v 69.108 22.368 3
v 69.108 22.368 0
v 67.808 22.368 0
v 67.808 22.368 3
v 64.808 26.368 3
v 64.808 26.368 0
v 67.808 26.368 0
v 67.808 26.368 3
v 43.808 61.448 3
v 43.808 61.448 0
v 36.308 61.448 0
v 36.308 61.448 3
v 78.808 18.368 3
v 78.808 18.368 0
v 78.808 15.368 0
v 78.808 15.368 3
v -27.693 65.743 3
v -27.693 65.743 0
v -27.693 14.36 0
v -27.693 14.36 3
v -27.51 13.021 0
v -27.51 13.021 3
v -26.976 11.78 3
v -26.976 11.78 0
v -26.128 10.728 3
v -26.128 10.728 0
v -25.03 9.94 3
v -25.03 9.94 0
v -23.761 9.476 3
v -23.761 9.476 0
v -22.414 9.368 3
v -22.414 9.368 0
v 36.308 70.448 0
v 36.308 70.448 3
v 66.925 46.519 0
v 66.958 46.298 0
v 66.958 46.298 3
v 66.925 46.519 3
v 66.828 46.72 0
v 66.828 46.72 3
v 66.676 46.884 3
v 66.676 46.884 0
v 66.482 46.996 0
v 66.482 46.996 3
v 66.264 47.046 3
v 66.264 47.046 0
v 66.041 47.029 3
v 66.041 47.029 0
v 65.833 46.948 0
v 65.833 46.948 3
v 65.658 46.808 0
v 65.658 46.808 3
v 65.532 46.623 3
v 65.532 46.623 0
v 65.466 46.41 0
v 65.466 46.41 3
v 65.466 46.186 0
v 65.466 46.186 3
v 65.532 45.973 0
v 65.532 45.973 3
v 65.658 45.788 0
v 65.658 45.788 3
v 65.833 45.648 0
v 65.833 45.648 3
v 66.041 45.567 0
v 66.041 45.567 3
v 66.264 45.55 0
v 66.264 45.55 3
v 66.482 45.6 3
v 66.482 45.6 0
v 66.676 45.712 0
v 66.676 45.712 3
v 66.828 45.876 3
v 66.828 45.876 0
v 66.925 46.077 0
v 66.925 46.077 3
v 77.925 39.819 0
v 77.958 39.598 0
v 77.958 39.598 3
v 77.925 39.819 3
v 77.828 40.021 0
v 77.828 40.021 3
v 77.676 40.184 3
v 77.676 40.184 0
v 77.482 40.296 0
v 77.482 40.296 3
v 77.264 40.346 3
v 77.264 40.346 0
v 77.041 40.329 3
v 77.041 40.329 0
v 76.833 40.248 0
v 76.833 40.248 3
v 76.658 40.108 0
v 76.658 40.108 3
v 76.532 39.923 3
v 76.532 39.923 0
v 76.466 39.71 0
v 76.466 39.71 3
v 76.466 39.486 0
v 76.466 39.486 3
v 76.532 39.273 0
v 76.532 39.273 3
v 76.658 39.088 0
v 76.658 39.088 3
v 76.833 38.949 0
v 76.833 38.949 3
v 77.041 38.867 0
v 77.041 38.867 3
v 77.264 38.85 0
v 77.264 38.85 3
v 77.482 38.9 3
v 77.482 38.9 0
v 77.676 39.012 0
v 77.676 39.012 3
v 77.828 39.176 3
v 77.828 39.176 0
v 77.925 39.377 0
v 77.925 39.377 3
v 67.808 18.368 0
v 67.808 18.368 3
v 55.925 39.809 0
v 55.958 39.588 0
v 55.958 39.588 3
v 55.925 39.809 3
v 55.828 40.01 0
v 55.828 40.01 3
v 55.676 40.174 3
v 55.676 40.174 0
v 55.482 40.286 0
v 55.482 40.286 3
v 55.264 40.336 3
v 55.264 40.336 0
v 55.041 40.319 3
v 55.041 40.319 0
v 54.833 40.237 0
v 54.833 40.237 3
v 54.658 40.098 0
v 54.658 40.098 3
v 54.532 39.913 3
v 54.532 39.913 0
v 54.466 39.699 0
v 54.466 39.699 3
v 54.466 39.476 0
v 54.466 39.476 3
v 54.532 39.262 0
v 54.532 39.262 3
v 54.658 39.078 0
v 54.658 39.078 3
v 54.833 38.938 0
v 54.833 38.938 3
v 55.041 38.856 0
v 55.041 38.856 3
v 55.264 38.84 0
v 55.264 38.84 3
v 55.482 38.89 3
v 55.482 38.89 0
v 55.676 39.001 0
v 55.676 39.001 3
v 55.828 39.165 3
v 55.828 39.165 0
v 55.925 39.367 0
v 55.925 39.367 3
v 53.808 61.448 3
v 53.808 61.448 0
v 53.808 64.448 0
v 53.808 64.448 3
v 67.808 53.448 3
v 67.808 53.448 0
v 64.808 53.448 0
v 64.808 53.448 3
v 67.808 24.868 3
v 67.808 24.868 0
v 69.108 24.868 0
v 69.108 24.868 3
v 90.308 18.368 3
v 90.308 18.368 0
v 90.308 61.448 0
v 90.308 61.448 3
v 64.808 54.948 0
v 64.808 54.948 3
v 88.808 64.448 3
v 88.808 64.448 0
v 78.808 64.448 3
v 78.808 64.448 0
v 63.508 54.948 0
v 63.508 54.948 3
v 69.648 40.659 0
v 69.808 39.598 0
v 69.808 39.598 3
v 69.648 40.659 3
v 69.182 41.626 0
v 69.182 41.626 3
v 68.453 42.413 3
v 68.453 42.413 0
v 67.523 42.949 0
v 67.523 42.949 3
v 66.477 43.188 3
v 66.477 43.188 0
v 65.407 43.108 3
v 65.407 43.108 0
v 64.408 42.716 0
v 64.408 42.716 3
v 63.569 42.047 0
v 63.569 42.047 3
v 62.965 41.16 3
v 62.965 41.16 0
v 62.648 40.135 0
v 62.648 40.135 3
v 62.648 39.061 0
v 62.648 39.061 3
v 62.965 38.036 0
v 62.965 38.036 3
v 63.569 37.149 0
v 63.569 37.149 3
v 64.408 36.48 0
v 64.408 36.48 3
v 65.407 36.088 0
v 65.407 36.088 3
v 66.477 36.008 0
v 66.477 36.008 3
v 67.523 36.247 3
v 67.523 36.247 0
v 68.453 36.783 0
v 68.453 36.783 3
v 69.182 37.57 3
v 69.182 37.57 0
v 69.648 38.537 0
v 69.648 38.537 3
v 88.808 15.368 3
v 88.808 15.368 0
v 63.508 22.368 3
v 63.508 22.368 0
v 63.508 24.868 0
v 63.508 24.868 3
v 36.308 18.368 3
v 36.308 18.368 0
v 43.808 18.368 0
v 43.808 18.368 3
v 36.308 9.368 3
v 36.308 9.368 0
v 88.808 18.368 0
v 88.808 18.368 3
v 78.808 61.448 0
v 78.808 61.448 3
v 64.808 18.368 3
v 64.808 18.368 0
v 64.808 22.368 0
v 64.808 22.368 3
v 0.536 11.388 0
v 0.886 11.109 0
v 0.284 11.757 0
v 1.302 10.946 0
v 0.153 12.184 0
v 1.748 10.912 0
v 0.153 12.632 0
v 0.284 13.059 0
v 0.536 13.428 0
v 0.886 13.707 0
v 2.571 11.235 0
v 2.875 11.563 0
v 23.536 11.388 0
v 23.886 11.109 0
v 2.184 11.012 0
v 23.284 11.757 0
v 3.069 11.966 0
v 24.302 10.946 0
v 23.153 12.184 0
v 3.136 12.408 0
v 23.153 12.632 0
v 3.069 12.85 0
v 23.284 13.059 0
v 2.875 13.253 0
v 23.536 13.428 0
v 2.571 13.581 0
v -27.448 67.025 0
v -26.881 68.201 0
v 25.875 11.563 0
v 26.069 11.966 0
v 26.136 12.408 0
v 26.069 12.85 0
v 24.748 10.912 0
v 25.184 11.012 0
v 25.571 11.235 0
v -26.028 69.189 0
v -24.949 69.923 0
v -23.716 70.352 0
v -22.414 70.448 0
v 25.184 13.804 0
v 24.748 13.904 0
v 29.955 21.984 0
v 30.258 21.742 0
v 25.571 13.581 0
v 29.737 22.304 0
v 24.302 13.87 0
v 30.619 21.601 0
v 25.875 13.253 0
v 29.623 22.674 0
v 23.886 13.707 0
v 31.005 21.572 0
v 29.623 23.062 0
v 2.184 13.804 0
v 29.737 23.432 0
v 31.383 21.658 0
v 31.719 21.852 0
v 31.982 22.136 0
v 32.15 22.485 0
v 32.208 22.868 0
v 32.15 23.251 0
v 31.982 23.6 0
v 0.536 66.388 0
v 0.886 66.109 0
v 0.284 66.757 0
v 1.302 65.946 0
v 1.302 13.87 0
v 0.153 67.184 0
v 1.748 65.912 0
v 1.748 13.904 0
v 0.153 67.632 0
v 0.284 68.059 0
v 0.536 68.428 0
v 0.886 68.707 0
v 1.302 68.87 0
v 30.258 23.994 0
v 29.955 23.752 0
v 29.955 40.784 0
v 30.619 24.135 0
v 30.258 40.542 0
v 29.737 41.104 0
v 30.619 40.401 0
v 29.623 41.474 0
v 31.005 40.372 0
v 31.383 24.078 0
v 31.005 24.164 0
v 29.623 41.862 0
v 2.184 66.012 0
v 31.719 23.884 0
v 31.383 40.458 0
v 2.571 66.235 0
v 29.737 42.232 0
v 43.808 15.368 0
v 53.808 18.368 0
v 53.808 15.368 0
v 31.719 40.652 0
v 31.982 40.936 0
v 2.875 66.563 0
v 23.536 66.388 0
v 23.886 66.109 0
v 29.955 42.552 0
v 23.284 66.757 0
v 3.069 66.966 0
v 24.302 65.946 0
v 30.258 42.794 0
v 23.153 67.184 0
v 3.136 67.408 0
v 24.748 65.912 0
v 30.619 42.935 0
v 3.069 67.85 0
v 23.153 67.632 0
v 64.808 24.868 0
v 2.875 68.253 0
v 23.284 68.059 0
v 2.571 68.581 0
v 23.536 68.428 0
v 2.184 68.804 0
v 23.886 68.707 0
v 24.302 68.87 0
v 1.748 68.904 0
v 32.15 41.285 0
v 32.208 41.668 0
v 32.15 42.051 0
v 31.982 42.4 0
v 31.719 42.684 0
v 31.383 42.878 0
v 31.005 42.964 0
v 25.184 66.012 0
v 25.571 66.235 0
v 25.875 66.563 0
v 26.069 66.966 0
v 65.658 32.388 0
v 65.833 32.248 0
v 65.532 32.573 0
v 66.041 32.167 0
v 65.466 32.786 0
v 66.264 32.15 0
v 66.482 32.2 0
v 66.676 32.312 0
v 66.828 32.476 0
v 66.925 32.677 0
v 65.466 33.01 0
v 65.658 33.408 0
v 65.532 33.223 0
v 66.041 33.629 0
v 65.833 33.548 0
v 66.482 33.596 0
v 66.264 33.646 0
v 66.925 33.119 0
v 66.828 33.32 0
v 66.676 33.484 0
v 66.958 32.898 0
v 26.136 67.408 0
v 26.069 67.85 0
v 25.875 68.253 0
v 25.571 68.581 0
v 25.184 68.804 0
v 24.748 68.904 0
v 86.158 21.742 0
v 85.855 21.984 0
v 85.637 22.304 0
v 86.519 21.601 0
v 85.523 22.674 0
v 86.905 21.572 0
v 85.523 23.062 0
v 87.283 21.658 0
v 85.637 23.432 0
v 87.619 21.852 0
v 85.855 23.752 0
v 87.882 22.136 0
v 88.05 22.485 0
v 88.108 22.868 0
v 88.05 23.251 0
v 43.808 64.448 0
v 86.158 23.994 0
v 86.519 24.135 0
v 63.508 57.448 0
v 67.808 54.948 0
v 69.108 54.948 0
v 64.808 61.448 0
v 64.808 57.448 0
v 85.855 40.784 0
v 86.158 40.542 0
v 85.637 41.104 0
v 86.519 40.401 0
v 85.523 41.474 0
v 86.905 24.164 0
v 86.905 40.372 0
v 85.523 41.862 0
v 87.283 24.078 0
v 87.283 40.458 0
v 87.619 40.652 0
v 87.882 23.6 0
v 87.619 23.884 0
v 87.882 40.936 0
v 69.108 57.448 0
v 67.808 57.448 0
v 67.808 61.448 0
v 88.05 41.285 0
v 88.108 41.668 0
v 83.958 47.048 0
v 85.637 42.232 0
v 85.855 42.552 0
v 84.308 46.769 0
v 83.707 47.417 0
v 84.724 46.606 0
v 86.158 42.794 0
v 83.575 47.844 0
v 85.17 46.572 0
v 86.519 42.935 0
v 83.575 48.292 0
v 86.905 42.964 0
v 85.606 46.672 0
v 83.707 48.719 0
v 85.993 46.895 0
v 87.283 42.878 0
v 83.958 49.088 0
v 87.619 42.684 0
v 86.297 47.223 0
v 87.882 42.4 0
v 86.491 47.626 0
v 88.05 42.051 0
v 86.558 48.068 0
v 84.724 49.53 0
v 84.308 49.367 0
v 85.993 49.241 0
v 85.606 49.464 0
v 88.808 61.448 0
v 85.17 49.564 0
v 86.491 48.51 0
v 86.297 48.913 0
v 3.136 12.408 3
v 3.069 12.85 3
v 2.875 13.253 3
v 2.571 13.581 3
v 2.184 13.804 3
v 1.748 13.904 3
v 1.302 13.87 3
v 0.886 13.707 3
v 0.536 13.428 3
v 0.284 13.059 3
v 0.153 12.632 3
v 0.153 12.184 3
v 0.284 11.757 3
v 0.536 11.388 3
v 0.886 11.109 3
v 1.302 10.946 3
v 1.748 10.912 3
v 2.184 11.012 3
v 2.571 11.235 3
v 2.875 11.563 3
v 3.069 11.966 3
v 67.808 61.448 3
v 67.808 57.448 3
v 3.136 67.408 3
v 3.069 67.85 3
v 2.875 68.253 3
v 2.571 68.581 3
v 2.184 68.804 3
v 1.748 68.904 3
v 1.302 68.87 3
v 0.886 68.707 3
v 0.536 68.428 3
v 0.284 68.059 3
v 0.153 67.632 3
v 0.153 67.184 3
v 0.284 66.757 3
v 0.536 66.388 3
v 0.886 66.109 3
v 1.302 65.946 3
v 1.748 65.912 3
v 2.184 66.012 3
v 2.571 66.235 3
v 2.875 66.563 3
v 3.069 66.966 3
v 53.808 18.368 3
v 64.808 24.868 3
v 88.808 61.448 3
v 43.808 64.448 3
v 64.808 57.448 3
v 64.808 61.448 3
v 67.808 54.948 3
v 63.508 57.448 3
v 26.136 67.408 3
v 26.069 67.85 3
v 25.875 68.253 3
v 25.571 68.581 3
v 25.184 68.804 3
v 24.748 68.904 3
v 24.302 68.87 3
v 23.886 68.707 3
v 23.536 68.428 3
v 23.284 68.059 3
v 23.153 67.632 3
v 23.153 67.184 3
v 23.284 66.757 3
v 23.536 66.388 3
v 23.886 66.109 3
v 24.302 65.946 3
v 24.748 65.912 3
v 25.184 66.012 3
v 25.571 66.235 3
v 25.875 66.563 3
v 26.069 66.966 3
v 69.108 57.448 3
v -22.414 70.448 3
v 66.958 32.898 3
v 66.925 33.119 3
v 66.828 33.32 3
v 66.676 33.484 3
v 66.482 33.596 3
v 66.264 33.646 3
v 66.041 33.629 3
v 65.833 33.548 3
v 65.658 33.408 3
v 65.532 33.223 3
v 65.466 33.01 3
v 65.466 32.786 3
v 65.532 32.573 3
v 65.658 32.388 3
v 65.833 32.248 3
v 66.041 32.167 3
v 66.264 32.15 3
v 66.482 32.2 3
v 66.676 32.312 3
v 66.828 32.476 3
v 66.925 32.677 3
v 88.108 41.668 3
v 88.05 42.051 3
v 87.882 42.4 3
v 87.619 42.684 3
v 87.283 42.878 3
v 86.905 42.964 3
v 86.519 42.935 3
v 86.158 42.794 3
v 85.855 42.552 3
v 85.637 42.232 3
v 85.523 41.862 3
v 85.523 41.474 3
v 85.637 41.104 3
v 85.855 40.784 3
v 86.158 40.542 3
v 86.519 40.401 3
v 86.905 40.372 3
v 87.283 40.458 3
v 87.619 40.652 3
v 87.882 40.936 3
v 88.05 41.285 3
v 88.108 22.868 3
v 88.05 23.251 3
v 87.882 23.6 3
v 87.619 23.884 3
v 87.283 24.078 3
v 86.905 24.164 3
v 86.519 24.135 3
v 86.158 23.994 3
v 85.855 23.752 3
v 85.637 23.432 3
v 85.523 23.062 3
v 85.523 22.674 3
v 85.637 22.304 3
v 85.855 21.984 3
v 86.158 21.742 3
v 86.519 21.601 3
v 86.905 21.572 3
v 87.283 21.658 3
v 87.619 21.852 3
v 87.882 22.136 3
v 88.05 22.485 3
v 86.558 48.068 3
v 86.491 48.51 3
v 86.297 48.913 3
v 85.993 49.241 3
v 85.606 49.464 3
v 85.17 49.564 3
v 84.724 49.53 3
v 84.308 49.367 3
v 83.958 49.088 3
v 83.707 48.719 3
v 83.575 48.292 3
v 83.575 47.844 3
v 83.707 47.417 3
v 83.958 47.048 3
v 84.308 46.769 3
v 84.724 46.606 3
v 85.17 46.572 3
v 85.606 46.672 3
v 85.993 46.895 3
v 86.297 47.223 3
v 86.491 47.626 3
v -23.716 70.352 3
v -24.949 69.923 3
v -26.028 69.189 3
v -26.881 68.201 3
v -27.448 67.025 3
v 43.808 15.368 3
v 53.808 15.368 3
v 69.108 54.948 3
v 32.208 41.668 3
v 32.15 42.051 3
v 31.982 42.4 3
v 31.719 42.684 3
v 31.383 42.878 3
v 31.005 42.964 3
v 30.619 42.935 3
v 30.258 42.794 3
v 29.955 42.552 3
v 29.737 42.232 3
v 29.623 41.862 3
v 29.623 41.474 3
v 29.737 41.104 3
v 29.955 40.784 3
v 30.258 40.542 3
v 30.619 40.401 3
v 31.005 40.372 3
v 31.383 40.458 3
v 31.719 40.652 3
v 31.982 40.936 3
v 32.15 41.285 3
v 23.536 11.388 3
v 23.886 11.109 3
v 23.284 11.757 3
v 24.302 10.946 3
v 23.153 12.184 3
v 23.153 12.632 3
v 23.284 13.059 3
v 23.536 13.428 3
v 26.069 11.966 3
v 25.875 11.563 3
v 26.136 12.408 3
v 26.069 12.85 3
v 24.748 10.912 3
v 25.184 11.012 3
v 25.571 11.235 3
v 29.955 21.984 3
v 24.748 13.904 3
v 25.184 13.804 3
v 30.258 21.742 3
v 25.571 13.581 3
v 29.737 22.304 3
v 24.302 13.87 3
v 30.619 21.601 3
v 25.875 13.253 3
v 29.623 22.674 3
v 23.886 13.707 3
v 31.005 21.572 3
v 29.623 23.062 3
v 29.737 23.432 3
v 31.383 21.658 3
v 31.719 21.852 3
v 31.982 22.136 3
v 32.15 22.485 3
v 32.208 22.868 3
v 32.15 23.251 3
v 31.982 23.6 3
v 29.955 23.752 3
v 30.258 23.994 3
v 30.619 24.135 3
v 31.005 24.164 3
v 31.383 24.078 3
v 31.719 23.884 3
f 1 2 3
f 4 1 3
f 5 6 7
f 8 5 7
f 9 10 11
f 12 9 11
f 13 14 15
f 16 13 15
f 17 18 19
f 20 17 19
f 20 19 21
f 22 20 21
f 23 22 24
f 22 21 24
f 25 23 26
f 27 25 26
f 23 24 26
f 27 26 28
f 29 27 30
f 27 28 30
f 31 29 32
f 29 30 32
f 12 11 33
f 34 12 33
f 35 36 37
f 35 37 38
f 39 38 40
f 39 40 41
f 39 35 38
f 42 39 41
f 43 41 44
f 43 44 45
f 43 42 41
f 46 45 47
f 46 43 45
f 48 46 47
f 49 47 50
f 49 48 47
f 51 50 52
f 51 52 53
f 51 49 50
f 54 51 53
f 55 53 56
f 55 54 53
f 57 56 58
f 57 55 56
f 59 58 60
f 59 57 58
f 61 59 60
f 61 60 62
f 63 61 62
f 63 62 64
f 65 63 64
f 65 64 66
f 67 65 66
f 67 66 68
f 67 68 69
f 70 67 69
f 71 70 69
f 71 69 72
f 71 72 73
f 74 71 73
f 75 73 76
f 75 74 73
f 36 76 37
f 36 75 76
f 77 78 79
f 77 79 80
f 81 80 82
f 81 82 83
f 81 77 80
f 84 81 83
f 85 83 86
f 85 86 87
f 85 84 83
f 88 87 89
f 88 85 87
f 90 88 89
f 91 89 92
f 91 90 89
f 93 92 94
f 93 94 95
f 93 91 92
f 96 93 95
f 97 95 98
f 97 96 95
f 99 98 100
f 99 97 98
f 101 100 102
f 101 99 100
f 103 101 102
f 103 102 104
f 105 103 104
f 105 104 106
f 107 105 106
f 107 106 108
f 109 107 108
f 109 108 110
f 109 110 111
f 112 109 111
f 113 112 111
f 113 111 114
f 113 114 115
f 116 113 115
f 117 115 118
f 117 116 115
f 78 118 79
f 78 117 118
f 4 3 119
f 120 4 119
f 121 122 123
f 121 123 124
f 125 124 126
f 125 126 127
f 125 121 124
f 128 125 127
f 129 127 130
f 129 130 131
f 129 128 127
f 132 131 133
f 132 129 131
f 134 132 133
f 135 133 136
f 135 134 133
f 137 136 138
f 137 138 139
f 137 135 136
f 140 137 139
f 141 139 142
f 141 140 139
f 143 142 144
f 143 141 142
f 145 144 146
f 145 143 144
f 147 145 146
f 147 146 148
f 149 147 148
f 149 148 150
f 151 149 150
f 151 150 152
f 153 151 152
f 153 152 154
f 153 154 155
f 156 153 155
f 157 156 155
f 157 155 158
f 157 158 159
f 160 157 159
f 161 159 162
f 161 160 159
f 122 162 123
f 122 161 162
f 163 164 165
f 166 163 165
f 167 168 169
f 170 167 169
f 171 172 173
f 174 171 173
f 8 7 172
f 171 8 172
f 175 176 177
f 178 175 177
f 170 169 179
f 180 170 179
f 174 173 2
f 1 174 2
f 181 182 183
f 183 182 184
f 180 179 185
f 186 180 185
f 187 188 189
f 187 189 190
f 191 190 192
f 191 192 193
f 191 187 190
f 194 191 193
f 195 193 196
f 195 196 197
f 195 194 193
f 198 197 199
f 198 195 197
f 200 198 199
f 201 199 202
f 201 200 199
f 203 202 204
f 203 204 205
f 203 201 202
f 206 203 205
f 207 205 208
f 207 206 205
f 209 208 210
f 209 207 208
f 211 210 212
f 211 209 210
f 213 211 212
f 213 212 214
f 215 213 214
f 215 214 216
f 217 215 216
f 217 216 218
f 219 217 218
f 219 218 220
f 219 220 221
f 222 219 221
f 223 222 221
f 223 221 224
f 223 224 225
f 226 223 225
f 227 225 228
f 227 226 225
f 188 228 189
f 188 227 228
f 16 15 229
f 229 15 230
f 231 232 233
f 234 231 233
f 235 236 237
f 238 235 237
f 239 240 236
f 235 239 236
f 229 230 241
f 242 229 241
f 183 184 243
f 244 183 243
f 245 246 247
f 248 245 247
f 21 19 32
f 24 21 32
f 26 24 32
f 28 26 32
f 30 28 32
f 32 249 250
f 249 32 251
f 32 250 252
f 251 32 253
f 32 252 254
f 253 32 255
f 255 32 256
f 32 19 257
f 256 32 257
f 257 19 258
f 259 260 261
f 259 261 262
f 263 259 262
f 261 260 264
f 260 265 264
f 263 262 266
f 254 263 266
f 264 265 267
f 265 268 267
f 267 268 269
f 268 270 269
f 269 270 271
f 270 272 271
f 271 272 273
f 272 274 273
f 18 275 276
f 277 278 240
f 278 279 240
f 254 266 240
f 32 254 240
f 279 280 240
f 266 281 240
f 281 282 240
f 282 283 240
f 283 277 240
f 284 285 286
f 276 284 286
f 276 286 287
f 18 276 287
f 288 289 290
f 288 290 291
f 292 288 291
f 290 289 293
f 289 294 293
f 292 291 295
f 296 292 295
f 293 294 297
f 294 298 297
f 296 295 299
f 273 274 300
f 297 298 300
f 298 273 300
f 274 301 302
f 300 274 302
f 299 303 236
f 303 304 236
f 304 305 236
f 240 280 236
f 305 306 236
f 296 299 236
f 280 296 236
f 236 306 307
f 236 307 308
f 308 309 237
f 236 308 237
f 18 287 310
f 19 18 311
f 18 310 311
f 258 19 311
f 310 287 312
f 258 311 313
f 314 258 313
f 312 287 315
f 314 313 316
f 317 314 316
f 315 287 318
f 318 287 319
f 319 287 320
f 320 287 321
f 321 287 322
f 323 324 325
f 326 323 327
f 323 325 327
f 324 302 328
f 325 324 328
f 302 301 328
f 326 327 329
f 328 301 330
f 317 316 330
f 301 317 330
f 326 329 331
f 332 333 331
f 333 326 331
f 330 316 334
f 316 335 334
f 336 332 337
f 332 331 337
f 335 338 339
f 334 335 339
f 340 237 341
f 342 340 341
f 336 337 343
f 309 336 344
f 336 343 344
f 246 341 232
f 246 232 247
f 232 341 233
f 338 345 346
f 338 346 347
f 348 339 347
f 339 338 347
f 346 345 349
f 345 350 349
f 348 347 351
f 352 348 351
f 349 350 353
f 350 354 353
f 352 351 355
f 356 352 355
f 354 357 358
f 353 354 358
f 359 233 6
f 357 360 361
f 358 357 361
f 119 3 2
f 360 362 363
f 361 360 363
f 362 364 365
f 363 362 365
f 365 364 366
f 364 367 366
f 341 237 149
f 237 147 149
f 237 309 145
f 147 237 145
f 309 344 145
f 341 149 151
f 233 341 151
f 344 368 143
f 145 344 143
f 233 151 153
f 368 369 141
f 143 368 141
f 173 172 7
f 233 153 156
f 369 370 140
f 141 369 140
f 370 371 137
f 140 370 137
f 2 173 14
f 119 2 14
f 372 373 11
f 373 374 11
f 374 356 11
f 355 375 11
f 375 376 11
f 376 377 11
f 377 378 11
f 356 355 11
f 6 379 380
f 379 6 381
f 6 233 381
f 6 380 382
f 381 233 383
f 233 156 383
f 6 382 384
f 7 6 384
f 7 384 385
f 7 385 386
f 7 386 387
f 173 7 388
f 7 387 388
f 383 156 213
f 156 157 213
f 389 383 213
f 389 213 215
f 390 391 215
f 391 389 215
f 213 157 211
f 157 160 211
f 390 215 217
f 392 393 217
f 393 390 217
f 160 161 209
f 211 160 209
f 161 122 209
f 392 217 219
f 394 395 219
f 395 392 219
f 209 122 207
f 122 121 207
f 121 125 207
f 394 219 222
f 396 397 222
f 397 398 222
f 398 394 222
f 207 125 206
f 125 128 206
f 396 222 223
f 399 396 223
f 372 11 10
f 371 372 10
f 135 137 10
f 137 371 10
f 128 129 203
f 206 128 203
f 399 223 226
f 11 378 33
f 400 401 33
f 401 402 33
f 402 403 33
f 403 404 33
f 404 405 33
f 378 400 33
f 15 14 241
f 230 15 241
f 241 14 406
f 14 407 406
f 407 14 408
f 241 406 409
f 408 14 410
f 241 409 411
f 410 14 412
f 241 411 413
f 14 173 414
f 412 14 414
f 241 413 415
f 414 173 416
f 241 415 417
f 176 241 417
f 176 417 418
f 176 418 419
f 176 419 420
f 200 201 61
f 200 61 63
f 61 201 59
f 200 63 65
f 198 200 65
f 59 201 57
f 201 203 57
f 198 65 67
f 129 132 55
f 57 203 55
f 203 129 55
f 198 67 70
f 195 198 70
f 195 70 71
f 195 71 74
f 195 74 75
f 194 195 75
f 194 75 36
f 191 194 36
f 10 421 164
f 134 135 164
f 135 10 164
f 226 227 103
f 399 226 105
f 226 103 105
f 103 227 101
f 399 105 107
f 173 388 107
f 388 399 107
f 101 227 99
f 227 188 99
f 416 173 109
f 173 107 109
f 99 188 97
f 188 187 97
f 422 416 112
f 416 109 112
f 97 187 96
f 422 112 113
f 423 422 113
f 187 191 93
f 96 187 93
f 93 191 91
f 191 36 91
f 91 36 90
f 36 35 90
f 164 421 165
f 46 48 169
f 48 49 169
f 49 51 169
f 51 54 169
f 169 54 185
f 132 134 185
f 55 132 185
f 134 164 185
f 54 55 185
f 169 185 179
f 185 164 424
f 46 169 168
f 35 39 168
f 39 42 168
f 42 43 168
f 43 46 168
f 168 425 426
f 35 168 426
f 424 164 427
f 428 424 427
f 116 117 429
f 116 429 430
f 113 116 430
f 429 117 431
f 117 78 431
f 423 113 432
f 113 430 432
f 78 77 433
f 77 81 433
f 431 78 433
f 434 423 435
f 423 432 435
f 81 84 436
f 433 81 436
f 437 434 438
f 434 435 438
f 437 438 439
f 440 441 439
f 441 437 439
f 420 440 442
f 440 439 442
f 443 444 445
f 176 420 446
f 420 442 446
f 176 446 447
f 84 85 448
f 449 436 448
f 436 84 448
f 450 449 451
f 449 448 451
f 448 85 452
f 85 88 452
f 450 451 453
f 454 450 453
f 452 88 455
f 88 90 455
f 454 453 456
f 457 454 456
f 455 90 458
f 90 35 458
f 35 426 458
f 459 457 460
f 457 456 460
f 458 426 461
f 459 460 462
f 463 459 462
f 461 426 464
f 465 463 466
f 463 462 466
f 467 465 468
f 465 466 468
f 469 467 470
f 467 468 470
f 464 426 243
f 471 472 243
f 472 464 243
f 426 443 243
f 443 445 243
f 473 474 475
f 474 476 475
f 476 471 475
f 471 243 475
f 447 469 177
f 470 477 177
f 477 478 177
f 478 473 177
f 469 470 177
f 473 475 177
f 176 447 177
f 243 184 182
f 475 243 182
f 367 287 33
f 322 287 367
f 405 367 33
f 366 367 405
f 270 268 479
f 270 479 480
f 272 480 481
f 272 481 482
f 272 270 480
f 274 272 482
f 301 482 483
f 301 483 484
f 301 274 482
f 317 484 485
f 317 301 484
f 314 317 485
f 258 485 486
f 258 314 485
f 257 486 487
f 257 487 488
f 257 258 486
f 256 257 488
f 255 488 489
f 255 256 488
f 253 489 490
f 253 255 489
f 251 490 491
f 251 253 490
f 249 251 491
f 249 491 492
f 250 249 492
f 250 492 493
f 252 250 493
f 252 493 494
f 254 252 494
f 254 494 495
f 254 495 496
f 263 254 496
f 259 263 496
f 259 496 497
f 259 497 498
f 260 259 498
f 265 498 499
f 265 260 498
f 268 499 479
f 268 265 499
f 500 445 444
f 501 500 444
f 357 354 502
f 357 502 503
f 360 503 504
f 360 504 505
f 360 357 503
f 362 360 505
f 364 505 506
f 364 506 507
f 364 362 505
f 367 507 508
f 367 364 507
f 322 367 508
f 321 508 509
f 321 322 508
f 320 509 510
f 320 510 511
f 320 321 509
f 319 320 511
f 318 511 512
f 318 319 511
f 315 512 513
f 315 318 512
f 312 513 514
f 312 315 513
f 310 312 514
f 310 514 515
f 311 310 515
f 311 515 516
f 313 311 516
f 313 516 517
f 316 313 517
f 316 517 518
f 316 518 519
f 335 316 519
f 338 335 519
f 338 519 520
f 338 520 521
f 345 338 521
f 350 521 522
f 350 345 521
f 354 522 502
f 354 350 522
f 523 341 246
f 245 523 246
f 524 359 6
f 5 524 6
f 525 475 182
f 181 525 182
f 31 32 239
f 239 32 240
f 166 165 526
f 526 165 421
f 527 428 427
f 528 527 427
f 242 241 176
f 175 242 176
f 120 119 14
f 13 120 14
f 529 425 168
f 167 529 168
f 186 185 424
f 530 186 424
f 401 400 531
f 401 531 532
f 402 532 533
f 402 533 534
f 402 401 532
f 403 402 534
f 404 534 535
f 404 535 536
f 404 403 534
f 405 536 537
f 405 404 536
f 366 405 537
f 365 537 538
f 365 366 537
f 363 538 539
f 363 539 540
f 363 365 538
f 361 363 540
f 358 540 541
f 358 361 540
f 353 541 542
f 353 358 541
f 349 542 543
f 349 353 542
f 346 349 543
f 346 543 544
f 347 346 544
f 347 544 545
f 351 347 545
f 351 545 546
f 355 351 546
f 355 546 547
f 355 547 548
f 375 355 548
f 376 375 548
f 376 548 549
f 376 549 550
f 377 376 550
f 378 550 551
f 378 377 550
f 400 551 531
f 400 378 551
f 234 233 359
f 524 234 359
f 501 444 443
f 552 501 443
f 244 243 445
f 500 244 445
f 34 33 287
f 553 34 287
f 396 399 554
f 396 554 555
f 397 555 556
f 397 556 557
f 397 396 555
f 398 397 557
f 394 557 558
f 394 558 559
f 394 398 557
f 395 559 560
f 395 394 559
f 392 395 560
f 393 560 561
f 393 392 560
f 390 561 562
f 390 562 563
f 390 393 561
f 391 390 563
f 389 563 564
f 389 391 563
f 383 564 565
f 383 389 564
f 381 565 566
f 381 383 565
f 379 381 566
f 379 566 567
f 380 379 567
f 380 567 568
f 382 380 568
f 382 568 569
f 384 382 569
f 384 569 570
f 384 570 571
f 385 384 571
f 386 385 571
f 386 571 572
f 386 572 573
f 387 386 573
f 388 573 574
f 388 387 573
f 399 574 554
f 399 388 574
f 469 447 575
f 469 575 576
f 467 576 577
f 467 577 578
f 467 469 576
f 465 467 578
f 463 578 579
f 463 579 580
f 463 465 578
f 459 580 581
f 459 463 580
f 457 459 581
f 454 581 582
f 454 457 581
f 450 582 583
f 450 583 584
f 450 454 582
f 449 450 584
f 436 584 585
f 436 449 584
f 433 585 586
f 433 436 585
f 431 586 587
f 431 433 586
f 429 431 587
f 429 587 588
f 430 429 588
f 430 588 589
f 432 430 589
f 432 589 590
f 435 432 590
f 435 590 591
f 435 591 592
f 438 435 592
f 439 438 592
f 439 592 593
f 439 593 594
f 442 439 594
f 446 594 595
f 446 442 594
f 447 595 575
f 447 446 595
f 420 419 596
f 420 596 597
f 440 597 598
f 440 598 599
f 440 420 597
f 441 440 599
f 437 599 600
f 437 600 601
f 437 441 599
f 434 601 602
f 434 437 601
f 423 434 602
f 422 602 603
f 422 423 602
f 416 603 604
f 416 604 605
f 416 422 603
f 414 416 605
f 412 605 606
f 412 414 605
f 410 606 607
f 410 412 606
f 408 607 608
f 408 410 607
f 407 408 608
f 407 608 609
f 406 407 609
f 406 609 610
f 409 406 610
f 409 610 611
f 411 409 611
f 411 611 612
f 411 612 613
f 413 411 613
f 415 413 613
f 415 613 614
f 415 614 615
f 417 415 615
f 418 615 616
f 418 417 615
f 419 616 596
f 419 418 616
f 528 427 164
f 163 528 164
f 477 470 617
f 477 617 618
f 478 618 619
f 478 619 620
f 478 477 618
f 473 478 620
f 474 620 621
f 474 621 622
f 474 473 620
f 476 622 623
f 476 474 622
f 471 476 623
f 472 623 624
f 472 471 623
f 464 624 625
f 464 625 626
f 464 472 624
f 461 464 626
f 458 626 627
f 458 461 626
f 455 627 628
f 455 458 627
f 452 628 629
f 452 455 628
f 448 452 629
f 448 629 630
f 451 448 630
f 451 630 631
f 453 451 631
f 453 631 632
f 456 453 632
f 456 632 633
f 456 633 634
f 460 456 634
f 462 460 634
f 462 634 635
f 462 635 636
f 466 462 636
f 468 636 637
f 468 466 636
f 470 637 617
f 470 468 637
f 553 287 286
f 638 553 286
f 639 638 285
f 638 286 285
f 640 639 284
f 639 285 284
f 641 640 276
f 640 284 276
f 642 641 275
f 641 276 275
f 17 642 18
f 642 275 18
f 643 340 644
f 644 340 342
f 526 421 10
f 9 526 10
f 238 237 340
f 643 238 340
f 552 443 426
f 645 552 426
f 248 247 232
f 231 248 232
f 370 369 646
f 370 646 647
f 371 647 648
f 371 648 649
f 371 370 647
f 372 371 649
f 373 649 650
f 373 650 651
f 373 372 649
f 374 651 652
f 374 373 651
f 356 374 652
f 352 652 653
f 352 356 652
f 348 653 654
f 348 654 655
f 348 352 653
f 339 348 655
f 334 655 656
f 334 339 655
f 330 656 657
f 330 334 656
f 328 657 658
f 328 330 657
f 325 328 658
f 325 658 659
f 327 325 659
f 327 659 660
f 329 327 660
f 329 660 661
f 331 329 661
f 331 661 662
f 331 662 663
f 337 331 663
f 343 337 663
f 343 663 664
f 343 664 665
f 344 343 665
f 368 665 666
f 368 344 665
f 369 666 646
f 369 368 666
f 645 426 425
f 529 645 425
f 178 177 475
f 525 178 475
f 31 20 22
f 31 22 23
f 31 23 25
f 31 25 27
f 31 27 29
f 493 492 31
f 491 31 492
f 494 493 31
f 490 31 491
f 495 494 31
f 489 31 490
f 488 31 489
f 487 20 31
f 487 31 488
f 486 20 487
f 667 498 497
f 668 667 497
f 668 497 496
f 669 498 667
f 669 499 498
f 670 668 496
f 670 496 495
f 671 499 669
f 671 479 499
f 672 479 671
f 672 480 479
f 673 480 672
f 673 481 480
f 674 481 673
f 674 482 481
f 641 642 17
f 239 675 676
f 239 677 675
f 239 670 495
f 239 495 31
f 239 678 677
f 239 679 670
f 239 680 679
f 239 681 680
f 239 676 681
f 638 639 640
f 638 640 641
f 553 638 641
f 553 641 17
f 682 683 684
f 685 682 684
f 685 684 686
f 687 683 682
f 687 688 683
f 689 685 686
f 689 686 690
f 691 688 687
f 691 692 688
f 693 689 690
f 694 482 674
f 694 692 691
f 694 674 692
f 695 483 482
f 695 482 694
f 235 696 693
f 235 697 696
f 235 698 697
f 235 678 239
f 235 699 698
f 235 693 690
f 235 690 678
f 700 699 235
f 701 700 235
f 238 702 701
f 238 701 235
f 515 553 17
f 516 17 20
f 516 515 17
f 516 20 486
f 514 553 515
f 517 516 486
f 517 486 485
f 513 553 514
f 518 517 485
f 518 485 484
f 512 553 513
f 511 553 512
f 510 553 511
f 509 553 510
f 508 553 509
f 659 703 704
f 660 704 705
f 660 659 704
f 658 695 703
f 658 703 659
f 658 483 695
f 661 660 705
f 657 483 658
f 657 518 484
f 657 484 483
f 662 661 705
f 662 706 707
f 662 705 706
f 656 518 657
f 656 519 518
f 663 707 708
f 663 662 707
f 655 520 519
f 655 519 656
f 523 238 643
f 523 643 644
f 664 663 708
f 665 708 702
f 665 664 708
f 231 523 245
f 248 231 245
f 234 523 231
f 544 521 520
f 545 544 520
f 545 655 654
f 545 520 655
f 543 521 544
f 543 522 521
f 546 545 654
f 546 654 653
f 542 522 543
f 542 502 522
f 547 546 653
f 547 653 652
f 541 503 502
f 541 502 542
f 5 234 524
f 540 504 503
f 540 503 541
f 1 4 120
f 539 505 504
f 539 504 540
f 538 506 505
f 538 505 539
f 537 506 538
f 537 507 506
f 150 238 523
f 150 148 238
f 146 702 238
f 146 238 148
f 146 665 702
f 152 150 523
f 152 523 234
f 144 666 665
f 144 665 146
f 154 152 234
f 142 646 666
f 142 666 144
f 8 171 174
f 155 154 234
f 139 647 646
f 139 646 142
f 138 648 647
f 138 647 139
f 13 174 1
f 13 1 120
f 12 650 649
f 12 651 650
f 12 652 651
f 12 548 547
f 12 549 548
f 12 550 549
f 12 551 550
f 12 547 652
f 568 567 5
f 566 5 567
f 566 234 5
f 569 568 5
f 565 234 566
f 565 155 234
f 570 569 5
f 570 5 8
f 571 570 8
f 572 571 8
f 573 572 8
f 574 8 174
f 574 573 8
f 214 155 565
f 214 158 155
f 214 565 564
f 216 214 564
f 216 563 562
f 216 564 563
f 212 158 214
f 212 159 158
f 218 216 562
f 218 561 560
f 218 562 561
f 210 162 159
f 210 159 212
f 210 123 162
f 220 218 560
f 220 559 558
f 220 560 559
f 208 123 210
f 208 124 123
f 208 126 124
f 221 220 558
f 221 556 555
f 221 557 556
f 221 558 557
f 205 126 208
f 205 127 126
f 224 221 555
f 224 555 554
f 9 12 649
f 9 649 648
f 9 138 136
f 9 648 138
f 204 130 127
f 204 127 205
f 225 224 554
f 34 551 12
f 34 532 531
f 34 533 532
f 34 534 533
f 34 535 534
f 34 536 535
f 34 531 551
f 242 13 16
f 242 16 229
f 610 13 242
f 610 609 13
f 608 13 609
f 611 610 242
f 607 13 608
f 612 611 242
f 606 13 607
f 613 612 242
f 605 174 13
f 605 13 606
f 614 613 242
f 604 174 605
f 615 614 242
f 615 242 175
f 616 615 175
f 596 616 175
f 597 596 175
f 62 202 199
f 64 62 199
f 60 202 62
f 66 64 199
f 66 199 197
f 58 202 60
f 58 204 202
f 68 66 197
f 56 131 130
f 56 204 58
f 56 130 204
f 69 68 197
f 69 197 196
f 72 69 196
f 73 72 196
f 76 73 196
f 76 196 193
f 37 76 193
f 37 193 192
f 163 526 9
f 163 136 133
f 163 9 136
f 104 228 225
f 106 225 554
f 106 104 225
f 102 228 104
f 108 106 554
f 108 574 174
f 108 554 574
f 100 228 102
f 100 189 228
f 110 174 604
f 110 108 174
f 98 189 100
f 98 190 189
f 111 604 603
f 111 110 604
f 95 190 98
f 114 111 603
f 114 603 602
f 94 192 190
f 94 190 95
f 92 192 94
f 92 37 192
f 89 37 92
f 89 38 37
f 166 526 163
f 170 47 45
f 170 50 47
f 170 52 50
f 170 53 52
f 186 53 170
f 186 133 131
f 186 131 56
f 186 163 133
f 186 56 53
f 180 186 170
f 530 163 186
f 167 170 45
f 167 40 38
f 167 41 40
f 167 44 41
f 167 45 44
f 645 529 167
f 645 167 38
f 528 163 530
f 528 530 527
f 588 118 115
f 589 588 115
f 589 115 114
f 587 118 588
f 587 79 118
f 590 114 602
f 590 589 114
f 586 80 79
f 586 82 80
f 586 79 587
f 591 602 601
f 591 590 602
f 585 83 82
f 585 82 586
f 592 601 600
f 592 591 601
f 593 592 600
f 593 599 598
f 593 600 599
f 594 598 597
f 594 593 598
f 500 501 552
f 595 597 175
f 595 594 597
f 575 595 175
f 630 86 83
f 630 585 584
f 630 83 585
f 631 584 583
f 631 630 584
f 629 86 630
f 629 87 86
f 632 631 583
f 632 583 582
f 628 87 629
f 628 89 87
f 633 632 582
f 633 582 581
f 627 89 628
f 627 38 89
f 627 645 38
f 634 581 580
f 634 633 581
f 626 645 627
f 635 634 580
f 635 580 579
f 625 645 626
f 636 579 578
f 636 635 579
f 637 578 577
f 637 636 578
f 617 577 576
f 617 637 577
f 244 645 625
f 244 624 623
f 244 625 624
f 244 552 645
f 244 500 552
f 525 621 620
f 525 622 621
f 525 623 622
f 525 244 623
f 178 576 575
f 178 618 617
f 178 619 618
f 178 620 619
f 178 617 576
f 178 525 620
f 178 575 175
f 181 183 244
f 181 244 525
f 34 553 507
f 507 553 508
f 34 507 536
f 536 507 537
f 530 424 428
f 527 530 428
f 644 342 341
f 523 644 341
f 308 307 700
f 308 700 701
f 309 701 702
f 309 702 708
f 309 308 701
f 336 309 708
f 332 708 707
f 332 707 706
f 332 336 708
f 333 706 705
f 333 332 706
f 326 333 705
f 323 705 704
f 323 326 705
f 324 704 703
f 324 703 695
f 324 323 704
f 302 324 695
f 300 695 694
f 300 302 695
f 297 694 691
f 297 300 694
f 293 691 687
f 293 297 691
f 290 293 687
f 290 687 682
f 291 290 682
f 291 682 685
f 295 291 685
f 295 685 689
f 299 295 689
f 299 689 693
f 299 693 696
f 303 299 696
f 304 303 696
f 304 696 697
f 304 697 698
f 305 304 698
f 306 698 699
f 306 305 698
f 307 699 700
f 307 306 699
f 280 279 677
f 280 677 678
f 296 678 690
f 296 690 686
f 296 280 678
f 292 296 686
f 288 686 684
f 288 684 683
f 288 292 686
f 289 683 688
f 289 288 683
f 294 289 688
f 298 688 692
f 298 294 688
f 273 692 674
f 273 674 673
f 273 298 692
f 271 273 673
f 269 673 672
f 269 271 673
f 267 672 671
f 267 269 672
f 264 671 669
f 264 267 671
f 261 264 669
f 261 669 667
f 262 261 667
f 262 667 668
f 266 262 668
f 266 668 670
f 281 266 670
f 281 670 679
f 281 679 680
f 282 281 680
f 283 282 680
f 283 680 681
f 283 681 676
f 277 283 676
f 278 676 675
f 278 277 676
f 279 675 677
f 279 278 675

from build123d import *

# Parameters (mm, degrees)
MODEL_R             = 3.6
MODEL_R_2           = 0.75
MODEL_R_3           = 1.500000002
MODEL_R_4           = 1.3
MODEL_R_5           = 1.5
BOSS_EXTRUDE1_DEPTH = 3


with BuildPart() as part:
    # Model → Boss-Extrude1 (new body)
    with BuildSketch(Plane.XY):
        with BuildLine():
            Line((43.808, 64.448), (43.808, 61.448))
            Line((43.808, 61.448), (36.308, 61.448))
            Line((36.308, 61.448), (36.308, 70.448))
            Line((36.308, 70.448), (-22.414233443, 70.448))
            ThreePointArc((-22.414233443, 70.448), (-26.027950405, 69.188749962), (-27.692809934, 65.743041952))
            Line((-27.692809934, 65.743041952), (-27.692809934, 14.360233482))
            ThreePointArc((-27.692809934, 14.360233482), (-26.128440702, 10.72754285), (-22.414233443, 9.368))
            Line((-22.414233443, 9.368), (36.308, 9.368))
            Line((36.308, 9.368), (36.308, 18.368))
            Line((36.308, 18.368), (43.808, 18.368))
            Line((43.808, 18.368), (43.808, 15.368))
            Line((43.808, 15.368), (53.808, 15.368))
            Line((53.808, 15.368), (53.808, 18.368))
            Line((53.808, 18.368), (64.808, 18.368))
            Line((64.808, 18.368), (64.808, 22.368))
            Line((64.808, 22.368), (63.508, 22.368))
            Line((63.508, 22.368), (63.508, 24.868))
            Line((63.508, 24.868), (64.808, 24.868))
            Line((64.808, 24.868), (64.808, 26.368))
            Line((64.808, 26.368), (67.808, 26.368))
            Line((67.808, 26.368), (67.808, 24.868))
            Line((67.808, 24.868), (69.108, 24.868))
            Line((69.108, 24.868), (69.108, 22.368))
            Line((69.108, 22.368), (67.808, 22.368))
            Line((67.808, 22.368), (67.808, 18.368))
            Line((67.808, 18.368), (78.808, 18.368))
            Line((78.808, 18.368), (78.808, 15.368))
            Line((78.808, 15.368), (88.808, 15.368))
            Line((88.808, 15.368), (88.808, 18.368))
            Line((88.808, 18.368), (90.308, 18.368))
            Line((90.308, 18.368), (90.308, 61.448))
            Line((90.308, 61.448), (88.808, 61.448))
            Line((88.808, 61.448), (88.808, 64.448))
            Line((88.808, 64.448), (78.808, 64.448))
            Line((78.808, 64.448), (78.808, 61.448))
            Line((78.808, 61.448), (67.808, 61.448))
            Line((67.808, 61.448), (67.808, 57.4481))
            Line((67.808, 57.4481), (69.108, 57.4481))
            Line((69.108, 57.4481), (69.108, 54.9481))
            Line((69.108, 54.9481), (67.808, 54.9481))
            Line((67.808, 54.9481), (67.808, 53.448))
            Line((67.808, 53.448), (64.808, 53.448))
            Line((64.808, 53.448), (64.808, 54.9481))
            Line((64.808, 54.9481), (63.508, 54.9481))
            Line((63.508, 54.9481), (63.508, 57.4481))
            Line((63.508, 57.4481), (64.808, 57.4481))
            Line((64.808, 57.4481), (64.808, 61.448))
            Line((64.808, 61.448), (53.808, 61.448))
            Line((53.808, 61.448), (53.808, 64.448))
            Line((53.808, 64.448), (43.808, 64.448))
        make_face()
        with Locations((66.20800481, 39.598049108)):
            Circle(MODEL_R, mode=Mode.SUBTRACT)
        with Locations((55.207943868, 39.587694441)):
            Circle(MODEL_R_2, mode=Mode.SUBTRACT)
        with Locations((66.20800481, 46.298)):
            Circle(MODEL_R_2, mode=Mode.SUBTRACT)
        with Locations((66.20800481, 32.898)):
            Circle(MODEL_R_2, mode=Mode.SUBTRACT)
        with Locations((77.20800481, 39.598049108)):
            Circle(MODEL_R_2, mode=Mode.SUBTRACT)
        with Locations((85.058, 48.068)):
            Circle(MODEL_R_3, mode=Mode.SUBTRACT)
        with Locations((30.908, 41.668)):
            Circle(MODEL_R_4, mode=Mode.SUBTRACT)
        with Locations((86.808, 41.668)):
            Circle(MODEL_R_4, mode=Mode.SUBTRACT)
        with Locations((30.908, 22.868)):
            Circle(MODEL_R_4, mode=Mode.SUBTRACT)
        with Locations((86.808, 22.868)):
            Circle(MODEL_R_4, mode=Mode.SUBTRACT)
        with Locations((1.635766557, 67.408)):
            Circle(MODEL_R_5, mode=Mode.SUBTRACT)
        with Locations((24.635766557, 67.408)):
            Circle(MODEL_R_5, mode=Mode.SUBTRACT)
        with Locations((1.635766557, 12.408)):
            Circle(MODEL_R_5, mode=Mode.SUBTRACT)
        with Locations((24.635766557, 12.408)):
            Circle(MODEL_R_5, mode=Mode.SUBTRACT)
    extrude(amount=BOSS_EXTRUDE1_DEPTH)


solid = part.part
